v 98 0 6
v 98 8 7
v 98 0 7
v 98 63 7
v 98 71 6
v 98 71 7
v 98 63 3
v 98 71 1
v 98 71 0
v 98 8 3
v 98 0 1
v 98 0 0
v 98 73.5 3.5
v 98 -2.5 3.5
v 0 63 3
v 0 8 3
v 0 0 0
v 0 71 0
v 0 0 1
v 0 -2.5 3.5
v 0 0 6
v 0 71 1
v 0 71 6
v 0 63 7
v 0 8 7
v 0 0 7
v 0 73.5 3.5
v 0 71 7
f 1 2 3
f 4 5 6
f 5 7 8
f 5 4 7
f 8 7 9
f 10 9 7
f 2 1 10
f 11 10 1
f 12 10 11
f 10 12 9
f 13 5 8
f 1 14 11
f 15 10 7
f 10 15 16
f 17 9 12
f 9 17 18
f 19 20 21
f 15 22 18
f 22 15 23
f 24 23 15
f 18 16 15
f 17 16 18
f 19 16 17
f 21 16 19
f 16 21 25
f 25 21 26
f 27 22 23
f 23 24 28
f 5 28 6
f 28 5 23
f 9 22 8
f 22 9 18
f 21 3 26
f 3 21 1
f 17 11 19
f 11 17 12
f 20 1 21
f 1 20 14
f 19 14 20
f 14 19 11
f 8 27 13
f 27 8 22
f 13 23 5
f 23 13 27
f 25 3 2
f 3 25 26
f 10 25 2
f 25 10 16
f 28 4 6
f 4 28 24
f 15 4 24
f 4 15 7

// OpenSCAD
// file: bbs_breadboard.scad
//
// This file contains models for breadboards.
//

//--------------------------------------------------------------------------------------
// Half size breadboard
//
module bbs_half_breadboard()
{
    cube([82.46, 54.41, 8.89], center=false);
}

//--------------------------------------------------------------------------------------
// Full size breadboard with screw mounting.  Measurements taken from an Archer brand
// breadboard that I got from Radio Shack (remember them?) years ago.
//
module bbs_full_breadboard()
{
    hole_rad = 2.91/2;
    difference()
    {
        cube([152.14, 53.36, 8.85]);
        translate([0, 0, -0.1]) bbs_full_breadboard_standoffs(9, hole_rad, 12);
    }
}

module bbs_full_breadboard_standoffs(height, radius, facets)
{
    hole_rad = 2.91/2;
    union()
    {
        translate([7.18 + hole_rad, 8.41 + hole_rad, 0]) cylinder(r=radius, h = height, $fn=facets);
        translate([142.11 + hole_rad, 8.41 + hole_rad, 0]) cylinder(r=radius, h = height, $fn=facets);
        translate([7.16 + hole_rad, 41.72 + hole_rad, 0]) cylinder(r=radius, h = height, $fn=facets);
        translate([142.11 + hole_rad, 41.72 + hole_rad, 0]) cylinder(r=radius, h = height, $fn=facets);
    }
}

//--------------------------------------------------------------------------------------
// Full size perma-proto board with screw mounting.
//
module bbs_full_permaprotoboard()
{
    hole_rad = 3.2/2;
    difference()
    {
        cube([157.67, 50.88, 2], center=false);
        translate([0, 0, -0.1]) bbs_full_permaprotoboard_standoffs(2.2, hole_rad, 12);
    }
}


module bbs_full_permaprotoboard_standoffs(height, radius, facets)
{
    hole_rad = 3.2/2;
    union()
    {
        translate([2.4 + hole_rad, 23.95 + hole_rad, 0]) cylinder(r=radius, h = height, $fn=facets);
        translate([77.16 + hole_rad, 23.95 + hole_rad, 0]) cylinder(r=radius, h = height, $fn=facets);
        translate([152.07 + hole_rad, 23.95 + hole_rad, 0]) cylinder(r=radius, h = height, $fn=facets);
    }
}

//--------------------------------------------------------------------------------------
// Half size perma-proto board with screw mounting.
//
module bbs_half_permaprotoboard()
{
    hole_rad = 3.2/2;
    difference()
    {
        cube([81.34, 50.88, 2], center=false);
        translate([0, 0, -0.1]) bbs_half_permaprotoboard_standoffs(2.2, hole_rad, 12);
    }
}


module bbs_half_permaprotoboard_standoffs(height, radius, facets)
{
    hole_rad = 3.2/2;
    union()
    {
        translate([2.3 + hole_rad, 23.95 + hole_rad, 0]) cylinder(r=radius, h = height, $fn=facets);
        translate([75.91 + hole_rad, 23.95 + hole_rad, 0]) cylinder(r=radius, h = height, $fn=facets);
    }
}

//--------------------------------------------------------------------------------------
// Quarter size perma-proto board with screw mounting.
//
module bbs_quarter_permaprotoboard()
{
    hole_rad = 3.2/2;
    difference()
    {
        cube([43.27, 50.88, 2], center=false);
        translate([0, 0, -0.1]) bbs_quarter_permaprotoboard_standoffs(2.2, hole_rad, 12);
    }
}


module bbs_quarter_permaprotoboard_standoffs(height, radius, facets)
{
    hole_rad = 3.2/2;
    union()
    {
        translate([2.3 + hole_rad, 23.95 + hole_rad, 0]) cylinder(r=radius, h = height, $fn=facets);
        translate([37.87 + hole_rad, 23.95 + hole_rad, 0]) cylinder(r=radius, h = height, $fn=facets);
    }
}

bbs_quarter_permaprotoboard();
translate([0, 60, 0]) bbs_half_permaprotoboard();
translate([0, 120, 0]) bbs_full_permaprotoboard();
// file: bbs_shapes.scad
//
// This is a catalogu of shapes that are used in other structures.  Each shape is
// parameterized to make them more flexible.
//
//===================================
// Triangular prism type 1.  This takes the form of an isosolese right triangle.
// The triangle is oriented with the hypotonuse in the y direction.  Extrusion is in the
// z direction.  Origin is at one end of the hypotonuse.
//
// Parameters
// s - size of triangle (length of hypotonuse)
// l - length of prism
//
module bbs_prism1(s, l)
{
    linear_extrude(height=l) polygon([[0, 0], [0, s], [s/2, s/2]]);
}
//
//===================================
// Triangular prism type 2.  This takes the form of an isosolese right triangle.
// The triangle is oriented with the right angle at the origin.  Extrusion is in the
// z direction.
//
// Parameters
// s - size of triangle (length of sides)
// l - length of prism
//
module bbs_prism2(s, l)
{
    linear_extrude(height=l) polygon([[0, 0], [0, s], [s, 0]]);
}
//
//===================================
// Fillet.  This is a square with a circle removed from it.  The circle
// has a radius equal to the square's sides and is positioned at one of the corners.  The
// length is in the z  direction.
//
// Parameters
// s - size of fillet
// l - length of extrusion
//
module bbs_fillet(s, l)
{
    difference()
    {
        cube([s, s, l]);
        translate([s, s, -0.1]) cylinder(r=s, h=l+0.2);
    }
}
//
//===================================
// Spacer.  This is a cylinder with a cylinder removed from the center of it.  It
// would typically be used to around a bolt to add some space like a standoff or
// as a washer.
//
// Parameters
// od - outside diameter
// id - inside diameter
// height - height
//
module bbs_spacer(od, id, height)
{
    difference()
    {
        cylinder(r=od/2, h=height, $fn=20);
        translate([0, 0, -0.1]) cylinder(r=id/2, h=height + 0.2, $fn=20);
    }
}
//
// Examples
//
//bbs_prism1(3, 5);
//translate([0, 7, 0]) bbs_prism2(3, 5);
//translate([7, 0, 0]) bbs_fillet(3, 5);
//bbs_spacer(23, 10, 16);
bbs_spacer(6, 4, 2);
// file: bbs_mini_rack_size.scad
//
// Constants to define the size of a mini rack and its components.  Using this include file will
// help to ensure that all components have a consistent size.  Other file can be created for other sizes
// of racks.  In those cases, ensure that the proper size file is included.
//
// Use functions for constants that should be exported
//
function bbs_rack_width() = 72;
function bbs_rack_length() = 100;
// main file
//
// Basic sliding tray to mount in a rack.  Varients of this tray can
// hold different electronic devices.  The knobs parameter is a boolean
// to determine in knobs are added to the tray (the default) or not.
// One may wish to omit the knobs if, for example, one wants a panel to
// cover the tray.
//
use <bbs_mini_rack_size.scad>
use <bbs_shapes.scad>
use <bbs_breadboard.scad>

length = bbs_rack_length()-2;
width = bbs_rack_width()-1;

module bbs_tray(knobs=true)
{
    difference()
    {
        union()
        {
            cube([length, width, 3], center=false); // Base
            translate([0, 0, 6])rotate([0, 90, 0]) rotate([0, 0, -90]) bbs_prism1(5, length); // Rail
            translate([0, width, 1])rotate([0, 90, 0]) rotate([0, 0, 90]) bbs_prism1(5, length); // Rail
            translate([0, 0, 0]) cube([length, 8, 7], center=false); // Side
            translate([0, width - 8, 0]) cube([length, 8, 7], center=false); // Side
//
            if (knobs)
            {
                translate([length, 3, 4]) rotate([0, 90, 0]) cylinder($fn=12, h=5, r=3);
                translate([length + 5, 0, 0]) cube([5, 8, 8], center=false); // Knob
                translate([length, width - 4, 4]) rotate([0, 90, 0]) cylinder($fn=12, h=5, r=3);
                translate([length + 5, width - 8, 0]) cube([5, 8, 8], center=false); // Knob
            }
        }
        union()
        {
        }
    }
}

bbs_tray(false);
//translate([10, 10, 7]) color("red") bbs_half_permaprotoboard();
